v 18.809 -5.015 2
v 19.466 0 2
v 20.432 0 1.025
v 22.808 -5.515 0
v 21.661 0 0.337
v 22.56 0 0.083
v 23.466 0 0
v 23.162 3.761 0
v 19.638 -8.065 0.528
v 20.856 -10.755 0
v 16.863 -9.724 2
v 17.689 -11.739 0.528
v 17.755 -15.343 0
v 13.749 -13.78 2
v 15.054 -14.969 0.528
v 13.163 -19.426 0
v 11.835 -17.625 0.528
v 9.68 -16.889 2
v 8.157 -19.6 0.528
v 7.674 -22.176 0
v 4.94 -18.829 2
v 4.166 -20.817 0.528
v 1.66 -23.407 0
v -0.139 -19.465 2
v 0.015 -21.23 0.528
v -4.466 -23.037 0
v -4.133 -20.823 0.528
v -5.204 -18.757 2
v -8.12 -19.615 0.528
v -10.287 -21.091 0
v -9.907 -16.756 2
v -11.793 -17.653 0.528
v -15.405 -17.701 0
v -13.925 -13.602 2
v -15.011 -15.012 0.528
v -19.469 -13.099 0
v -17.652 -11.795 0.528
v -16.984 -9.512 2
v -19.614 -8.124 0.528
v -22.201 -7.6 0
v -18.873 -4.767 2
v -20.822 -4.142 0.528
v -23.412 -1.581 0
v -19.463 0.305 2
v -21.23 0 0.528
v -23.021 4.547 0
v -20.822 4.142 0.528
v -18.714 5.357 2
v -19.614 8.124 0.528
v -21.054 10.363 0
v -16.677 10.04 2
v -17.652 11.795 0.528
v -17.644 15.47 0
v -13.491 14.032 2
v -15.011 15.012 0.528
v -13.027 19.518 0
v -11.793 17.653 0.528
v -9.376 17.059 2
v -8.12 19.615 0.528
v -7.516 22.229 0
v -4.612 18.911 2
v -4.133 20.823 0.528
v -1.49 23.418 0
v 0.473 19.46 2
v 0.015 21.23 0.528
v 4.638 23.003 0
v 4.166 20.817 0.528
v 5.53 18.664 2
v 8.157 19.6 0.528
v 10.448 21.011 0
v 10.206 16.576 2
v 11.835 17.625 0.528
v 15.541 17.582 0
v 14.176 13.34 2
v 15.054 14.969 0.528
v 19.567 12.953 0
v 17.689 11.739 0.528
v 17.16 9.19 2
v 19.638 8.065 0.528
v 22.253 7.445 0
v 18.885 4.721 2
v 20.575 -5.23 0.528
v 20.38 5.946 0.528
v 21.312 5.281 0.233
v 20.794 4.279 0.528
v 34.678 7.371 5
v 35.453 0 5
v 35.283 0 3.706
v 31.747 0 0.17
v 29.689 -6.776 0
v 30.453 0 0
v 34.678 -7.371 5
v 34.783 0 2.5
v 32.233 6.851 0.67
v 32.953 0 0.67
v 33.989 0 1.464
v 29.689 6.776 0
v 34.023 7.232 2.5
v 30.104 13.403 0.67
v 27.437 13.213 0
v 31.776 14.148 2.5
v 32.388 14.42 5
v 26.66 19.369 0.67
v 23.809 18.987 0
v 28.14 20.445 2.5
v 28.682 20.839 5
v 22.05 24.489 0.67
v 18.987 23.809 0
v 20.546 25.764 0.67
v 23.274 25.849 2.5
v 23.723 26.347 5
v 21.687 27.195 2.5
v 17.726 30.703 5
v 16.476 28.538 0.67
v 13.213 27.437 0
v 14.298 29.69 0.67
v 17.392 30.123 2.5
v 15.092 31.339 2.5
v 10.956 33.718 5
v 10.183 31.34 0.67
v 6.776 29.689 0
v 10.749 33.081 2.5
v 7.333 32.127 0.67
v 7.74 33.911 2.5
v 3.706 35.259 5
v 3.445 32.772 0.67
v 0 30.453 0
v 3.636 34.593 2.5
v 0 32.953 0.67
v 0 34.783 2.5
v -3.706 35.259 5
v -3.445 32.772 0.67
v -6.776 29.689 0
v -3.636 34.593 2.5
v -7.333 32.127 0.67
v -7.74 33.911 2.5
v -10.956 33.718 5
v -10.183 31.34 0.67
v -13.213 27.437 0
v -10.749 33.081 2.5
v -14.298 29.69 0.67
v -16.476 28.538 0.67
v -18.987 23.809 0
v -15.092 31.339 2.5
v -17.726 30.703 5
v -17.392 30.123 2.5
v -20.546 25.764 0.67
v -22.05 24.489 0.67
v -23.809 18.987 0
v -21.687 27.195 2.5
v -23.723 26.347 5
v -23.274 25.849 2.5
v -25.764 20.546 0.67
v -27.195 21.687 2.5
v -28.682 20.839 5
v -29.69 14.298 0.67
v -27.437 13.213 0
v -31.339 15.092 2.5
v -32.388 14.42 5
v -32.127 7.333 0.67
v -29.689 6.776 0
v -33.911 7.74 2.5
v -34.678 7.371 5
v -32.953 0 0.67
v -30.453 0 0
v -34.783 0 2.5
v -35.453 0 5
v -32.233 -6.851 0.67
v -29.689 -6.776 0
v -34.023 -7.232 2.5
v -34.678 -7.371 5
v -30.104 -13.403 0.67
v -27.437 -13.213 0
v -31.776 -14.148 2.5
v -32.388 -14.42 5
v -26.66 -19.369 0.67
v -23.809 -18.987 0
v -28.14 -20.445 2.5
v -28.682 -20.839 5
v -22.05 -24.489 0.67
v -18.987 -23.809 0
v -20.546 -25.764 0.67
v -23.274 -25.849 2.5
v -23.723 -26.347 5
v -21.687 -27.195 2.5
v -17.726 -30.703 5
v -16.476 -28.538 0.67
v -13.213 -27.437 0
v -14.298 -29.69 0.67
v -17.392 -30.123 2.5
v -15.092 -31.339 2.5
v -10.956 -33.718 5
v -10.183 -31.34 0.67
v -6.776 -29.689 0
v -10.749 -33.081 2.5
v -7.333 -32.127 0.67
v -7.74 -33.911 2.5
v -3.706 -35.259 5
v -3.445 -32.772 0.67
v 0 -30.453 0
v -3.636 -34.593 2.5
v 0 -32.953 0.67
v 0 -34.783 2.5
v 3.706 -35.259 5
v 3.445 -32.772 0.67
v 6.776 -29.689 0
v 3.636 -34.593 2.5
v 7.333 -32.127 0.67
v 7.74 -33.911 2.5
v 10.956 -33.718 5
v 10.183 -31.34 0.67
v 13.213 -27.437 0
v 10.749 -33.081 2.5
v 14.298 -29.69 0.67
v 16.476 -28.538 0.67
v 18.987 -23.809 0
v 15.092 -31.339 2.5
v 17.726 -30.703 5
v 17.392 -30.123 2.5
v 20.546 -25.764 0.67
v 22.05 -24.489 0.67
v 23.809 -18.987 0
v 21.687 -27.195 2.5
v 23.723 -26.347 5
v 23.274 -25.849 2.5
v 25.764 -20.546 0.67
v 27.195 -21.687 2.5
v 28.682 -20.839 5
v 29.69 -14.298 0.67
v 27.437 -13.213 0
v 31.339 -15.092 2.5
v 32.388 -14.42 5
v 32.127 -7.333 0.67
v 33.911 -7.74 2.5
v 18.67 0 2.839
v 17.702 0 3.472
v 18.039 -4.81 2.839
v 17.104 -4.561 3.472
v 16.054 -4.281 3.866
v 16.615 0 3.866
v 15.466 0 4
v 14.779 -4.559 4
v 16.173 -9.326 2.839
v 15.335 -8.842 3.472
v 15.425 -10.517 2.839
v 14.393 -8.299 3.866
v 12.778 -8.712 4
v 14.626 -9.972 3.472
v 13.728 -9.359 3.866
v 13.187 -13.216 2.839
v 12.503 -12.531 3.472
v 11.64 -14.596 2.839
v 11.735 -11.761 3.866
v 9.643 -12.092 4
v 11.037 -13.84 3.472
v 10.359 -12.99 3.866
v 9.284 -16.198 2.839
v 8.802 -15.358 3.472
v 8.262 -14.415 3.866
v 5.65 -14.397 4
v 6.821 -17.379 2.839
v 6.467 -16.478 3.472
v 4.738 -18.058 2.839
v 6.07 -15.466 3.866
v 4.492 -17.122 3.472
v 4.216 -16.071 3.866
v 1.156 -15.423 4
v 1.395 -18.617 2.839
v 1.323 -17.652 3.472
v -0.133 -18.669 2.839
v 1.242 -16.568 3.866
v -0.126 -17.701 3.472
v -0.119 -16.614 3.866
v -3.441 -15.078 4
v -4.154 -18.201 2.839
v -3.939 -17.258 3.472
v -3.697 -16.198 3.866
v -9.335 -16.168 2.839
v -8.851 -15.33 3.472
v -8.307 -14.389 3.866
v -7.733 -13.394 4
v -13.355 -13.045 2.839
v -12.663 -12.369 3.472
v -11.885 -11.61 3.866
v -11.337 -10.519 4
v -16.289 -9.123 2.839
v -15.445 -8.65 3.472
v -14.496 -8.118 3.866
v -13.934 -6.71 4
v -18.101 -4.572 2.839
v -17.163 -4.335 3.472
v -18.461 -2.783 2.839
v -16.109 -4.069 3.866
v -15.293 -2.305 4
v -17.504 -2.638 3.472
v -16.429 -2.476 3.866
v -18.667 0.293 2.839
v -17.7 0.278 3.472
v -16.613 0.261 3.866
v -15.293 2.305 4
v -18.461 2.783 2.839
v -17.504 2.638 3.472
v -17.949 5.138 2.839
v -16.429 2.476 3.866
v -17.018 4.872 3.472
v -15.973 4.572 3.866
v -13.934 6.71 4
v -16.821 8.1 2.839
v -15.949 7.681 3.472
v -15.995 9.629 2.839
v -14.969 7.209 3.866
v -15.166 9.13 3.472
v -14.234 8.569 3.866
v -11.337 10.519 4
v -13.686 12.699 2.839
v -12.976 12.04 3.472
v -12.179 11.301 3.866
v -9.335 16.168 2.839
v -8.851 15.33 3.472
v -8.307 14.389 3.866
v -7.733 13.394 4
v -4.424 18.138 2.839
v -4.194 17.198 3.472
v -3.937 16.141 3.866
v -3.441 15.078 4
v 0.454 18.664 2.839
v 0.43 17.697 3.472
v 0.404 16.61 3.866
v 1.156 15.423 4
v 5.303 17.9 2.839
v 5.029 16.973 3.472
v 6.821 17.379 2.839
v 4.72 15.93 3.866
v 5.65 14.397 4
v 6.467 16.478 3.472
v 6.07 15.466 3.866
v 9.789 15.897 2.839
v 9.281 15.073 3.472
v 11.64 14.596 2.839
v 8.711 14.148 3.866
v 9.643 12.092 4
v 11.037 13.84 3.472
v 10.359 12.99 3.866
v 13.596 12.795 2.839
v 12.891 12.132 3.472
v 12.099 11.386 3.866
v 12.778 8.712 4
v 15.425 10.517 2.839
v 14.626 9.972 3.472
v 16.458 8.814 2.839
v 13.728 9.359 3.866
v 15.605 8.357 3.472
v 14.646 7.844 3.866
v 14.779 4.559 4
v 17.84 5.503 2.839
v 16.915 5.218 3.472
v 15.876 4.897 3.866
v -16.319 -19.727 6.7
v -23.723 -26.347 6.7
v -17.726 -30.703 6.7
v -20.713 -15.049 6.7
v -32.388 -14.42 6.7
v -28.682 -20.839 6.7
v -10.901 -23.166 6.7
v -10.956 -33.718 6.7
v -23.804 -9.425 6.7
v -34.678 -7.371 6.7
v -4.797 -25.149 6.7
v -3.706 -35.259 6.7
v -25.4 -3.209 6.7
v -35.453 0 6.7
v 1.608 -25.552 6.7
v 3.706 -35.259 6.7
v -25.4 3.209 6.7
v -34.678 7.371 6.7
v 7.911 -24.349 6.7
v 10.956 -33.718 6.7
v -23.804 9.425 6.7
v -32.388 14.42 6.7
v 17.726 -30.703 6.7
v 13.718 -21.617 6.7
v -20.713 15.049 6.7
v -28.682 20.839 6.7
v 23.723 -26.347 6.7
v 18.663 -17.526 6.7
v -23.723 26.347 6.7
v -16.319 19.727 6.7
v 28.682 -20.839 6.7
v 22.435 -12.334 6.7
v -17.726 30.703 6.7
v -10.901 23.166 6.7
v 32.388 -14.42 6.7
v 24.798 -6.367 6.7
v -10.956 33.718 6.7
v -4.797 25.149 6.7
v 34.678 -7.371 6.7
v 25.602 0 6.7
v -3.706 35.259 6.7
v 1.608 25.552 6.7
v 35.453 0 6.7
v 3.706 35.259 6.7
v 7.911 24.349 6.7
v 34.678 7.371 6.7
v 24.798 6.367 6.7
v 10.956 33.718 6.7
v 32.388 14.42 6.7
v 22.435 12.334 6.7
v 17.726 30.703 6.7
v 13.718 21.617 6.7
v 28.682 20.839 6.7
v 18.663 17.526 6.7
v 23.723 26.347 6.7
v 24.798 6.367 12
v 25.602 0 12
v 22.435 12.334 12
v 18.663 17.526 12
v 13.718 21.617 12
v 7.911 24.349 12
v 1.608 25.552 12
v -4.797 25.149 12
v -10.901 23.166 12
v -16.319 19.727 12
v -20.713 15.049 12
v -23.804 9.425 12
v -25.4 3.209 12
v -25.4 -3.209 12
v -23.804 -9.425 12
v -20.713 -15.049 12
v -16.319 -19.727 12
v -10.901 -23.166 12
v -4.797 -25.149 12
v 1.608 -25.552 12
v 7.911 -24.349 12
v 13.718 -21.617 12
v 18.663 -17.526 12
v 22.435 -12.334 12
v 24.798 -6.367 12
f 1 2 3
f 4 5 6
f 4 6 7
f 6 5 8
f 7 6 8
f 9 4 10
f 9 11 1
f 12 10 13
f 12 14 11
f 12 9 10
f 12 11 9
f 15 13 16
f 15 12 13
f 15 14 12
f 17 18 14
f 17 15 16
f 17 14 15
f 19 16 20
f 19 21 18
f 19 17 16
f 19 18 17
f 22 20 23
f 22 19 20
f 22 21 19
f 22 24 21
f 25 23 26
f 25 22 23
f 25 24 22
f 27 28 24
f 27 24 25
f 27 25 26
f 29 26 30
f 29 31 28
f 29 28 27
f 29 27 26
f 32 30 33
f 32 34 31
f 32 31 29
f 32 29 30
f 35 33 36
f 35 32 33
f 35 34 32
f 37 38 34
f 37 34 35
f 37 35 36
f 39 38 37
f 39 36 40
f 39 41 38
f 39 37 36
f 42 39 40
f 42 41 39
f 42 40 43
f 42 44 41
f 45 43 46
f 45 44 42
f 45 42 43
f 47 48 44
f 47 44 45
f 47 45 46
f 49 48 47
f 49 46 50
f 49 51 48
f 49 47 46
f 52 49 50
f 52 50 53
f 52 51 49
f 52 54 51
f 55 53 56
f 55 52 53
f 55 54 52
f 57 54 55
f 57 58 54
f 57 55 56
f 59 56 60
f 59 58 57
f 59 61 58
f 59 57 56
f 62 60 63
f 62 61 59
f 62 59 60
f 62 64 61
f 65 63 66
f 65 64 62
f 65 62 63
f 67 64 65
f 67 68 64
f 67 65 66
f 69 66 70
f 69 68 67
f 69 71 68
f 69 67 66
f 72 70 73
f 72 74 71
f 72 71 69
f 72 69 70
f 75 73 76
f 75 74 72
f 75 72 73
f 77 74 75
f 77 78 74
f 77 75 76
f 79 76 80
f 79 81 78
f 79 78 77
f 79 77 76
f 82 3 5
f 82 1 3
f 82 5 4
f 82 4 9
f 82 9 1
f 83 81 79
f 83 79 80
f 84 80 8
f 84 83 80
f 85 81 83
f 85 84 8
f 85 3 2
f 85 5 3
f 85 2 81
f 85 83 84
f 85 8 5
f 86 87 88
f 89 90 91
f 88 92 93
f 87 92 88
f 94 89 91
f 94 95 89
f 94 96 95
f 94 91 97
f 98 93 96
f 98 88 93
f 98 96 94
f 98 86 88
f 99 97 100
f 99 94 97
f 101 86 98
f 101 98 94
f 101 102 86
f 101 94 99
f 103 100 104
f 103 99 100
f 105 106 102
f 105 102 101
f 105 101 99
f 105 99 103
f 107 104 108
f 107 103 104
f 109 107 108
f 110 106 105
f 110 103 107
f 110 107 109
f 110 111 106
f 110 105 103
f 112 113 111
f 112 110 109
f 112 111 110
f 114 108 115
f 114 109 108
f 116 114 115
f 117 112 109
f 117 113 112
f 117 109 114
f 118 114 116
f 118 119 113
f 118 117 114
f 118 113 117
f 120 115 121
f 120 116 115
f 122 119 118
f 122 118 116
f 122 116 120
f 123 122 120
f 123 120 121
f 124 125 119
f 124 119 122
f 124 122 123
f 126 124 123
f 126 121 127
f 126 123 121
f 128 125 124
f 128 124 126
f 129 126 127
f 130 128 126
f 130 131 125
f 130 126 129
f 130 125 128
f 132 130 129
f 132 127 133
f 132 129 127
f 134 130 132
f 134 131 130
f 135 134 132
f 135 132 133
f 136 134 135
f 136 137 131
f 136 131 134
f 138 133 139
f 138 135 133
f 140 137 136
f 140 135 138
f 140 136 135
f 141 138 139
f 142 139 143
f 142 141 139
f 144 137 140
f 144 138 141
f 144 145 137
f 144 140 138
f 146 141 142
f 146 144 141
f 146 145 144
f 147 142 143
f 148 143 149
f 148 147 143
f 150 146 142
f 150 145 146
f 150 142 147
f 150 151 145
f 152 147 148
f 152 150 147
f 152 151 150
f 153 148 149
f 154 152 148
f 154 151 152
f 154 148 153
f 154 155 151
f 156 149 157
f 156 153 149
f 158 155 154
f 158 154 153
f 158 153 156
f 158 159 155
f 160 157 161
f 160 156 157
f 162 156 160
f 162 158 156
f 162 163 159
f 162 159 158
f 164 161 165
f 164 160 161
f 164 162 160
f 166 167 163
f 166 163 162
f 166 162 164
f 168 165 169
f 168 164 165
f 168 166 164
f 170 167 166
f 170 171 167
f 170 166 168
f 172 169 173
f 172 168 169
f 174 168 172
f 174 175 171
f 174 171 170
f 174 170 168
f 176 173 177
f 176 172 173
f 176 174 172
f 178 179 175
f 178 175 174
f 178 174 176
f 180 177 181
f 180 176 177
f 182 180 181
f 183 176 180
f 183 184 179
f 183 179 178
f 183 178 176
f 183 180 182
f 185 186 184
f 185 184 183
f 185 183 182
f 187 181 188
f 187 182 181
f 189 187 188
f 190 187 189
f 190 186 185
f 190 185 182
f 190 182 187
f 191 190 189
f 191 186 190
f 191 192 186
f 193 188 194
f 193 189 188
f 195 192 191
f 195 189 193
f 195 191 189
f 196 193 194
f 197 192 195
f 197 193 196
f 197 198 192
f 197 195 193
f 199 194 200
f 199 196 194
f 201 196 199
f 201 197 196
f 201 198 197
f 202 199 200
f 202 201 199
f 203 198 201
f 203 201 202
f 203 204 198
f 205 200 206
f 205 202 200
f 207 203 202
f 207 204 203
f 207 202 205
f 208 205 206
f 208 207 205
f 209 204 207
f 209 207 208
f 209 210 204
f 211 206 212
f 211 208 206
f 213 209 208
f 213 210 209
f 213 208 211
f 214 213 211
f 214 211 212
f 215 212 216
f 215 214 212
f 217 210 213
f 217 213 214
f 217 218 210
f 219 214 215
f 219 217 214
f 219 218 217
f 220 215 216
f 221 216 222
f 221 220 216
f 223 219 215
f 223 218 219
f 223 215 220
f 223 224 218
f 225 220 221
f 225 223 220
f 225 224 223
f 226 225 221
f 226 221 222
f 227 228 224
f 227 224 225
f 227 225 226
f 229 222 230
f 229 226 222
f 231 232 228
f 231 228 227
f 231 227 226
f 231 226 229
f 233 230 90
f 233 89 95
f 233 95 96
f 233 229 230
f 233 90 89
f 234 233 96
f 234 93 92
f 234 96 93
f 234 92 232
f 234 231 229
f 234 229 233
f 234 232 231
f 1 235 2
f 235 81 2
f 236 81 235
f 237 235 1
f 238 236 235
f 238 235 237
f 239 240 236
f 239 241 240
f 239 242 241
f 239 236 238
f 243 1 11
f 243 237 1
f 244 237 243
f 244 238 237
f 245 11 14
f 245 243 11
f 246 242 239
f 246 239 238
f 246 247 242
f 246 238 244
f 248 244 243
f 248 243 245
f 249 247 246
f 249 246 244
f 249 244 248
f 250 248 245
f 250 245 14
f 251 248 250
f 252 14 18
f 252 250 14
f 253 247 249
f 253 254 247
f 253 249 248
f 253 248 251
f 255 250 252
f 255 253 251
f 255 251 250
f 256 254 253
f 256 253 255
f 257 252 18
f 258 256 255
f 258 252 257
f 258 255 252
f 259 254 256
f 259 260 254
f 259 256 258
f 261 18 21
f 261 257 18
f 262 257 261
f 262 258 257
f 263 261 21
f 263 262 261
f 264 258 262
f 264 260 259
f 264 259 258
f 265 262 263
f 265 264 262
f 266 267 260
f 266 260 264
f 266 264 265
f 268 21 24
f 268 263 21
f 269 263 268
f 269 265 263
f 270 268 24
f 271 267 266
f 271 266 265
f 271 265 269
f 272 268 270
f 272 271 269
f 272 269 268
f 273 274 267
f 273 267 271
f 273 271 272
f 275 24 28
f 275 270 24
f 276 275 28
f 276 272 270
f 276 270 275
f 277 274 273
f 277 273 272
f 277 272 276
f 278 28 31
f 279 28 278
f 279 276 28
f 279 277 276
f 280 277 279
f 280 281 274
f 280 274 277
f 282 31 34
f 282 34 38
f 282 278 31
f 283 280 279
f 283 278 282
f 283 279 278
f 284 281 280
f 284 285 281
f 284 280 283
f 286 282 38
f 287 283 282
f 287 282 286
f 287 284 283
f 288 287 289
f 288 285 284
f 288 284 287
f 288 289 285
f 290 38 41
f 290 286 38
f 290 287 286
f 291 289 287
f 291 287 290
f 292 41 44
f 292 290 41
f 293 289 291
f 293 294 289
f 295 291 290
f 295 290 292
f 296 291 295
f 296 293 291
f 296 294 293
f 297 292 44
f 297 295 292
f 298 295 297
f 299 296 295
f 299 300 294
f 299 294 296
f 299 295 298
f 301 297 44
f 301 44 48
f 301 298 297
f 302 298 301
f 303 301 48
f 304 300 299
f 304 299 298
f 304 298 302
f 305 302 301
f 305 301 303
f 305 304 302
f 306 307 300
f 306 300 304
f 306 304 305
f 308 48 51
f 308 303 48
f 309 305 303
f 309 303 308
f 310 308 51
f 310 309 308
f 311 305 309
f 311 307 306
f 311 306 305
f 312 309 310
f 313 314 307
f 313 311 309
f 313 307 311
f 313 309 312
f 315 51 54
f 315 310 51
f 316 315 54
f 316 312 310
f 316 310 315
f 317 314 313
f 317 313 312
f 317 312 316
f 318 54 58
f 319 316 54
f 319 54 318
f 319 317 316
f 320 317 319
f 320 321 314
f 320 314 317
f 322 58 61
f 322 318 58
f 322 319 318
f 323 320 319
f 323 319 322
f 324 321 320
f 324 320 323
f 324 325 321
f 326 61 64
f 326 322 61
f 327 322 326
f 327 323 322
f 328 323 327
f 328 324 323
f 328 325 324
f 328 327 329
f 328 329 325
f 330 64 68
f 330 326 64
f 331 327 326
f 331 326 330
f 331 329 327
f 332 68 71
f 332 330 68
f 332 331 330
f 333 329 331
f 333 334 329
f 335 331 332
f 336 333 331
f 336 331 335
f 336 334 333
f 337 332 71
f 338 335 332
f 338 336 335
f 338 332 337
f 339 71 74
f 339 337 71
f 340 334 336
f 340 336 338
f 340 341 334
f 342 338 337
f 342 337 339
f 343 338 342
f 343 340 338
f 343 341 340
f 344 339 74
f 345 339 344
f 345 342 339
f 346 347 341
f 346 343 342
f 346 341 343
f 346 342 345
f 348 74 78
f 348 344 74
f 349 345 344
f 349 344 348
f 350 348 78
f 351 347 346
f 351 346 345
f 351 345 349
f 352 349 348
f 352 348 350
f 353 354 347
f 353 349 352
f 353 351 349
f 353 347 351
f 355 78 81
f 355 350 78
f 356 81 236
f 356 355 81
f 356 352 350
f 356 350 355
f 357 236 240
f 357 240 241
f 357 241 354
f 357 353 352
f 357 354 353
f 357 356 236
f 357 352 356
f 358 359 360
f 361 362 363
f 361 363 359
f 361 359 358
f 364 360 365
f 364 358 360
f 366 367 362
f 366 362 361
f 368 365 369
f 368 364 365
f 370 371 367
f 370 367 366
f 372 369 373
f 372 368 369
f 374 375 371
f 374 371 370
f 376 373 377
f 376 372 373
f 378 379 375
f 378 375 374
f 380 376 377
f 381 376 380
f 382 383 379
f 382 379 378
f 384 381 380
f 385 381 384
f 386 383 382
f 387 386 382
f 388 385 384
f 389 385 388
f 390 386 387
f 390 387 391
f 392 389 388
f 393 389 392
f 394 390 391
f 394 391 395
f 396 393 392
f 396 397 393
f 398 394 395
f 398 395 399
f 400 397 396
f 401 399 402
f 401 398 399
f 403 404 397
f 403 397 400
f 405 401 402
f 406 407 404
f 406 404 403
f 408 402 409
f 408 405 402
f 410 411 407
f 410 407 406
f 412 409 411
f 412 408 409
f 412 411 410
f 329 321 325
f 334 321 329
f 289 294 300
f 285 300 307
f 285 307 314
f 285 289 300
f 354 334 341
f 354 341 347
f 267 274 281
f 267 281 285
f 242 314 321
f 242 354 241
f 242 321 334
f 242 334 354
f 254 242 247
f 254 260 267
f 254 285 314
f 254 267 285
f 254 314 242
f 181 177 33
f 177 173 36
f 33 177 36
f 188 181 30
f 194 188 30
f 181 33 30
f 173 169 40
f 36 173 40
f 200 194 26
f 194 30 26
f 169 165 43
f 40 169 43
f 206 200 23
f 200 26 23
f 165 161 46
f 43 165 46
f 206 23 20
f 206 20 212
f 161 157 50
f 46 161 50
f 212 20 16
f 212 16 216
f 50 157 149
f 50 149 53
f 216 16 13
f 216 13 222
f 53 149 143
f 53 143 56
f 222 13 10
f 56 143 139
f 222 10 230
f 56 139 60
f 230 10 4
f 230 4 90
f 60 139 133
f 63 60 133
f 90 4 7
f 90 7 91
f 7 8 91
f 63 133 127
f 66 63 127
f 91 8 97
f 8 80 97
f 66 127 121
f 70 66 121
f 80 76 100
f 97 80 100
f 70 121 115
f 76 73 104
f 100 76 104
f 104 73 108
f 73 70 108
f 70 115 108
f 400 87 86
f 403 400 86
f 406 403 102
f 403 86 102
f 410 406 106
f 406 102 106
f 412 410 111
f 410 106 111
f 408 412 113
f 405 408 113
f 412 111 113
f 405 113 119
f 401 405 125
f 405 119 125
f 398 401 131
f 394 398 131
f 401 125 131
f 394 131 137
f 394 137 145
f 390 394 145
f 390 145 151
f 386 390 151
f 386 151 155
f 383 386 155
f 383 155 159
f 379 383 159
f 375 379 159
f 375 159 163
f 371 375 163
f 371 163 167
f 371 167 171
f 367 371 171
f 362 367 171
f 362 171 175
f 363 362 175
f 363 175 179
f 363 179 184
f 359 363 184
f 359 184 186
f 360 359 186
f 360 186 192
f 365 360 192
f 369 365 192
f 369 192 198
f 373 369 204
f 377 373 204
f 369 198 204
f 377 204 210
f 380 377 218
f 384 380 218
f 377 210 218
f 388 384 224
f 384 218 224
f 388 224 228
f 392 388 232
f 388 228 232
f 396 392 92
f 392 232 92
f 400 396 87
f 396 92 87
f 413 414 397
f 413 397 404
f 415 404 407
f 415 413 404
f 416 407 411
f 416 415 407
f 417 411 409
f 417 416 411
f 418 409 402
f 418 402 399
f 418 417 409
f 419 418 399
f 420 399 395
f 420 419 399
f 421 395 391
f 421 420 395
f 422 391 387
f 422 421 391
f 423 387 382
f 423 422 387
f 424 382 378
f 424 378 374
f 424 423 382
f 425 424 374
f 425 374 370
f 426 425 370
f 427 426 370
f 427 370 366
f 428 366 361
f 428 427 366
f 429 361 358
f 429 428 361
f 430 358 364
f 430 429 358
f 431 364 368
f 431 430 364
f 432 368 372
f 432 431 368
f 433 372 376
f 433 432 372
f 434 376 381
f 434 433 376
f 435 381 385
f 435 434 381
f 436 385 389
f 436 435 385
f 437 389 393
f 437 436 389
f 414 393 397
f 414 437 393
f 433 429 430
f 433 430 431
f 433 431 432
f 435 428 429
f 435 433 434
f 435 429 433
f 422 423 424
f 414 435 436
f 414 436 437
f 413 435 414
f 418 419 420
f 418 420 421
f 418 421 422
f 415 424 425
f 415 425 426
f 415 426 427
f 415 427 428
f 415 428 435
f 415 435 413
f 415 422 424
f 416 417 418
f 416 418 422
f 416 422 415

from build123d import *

# Parameters (mm, degrees)
F0_R     = 35.4529924148
F0_R_2   = 26.5998947574
F1_DEPTH = 12
F2_R     = 20.3647706408
F3_DEPTH = 4
F5_R     = 5
F6_R     = 5
F7_R     = 35.4529924148
F7_R_2   = 25.6021329211
F8_DEPTH = 5.3


# Not quite as in the source:
# - a fillet or chamfer that OpenCascade refuses, or shapes differently, is made with other operations: its cross-section is extruded or revolved along the edge and cut away or added


with BuildPart() as f1:
    # F0 (on Top) → F1 (new body)
    with BuildSketch(Plane.XY):
        Circle(F0_R)
        Circle(F0_R_2, mode=Mode.SUBTRACT)
        Circle(F0_R_2)
    extrude(amount=F1_DEPTH)

    # F2 (on face) → F3 (cut)
    with BuildSketch(Plane(origin=(0, 0, 0), x_dir=(1, 0, 0), z_dir=(0, 0, -1))):
        Circle(F2_R)
    extrude(amount=-F3_DEPTH, mode=Mode.SUBTRACT)

    # F4: fillet of radius 5 on 1 edges, made by hand

    # F4_s1 → F4_t2 (revolve)
    with BuildSketch(Plane.XZ):
        with BuildLine():
            ThreePointArc((20.3647706408, 0), (18.6280688154, 2.8729833462), (15.4657911552, 4))
            Line((15.4657911552, 4), (20.3647706408, 4))
            Line((20.3647706408, 4), (20.3647706408, 0))
        make_face()
    revolve(axis=Axis((0, 0, 4), (0, 0, -1)))

    # F5
    f5_edges = [f1.edges().sort_by_distance(p)[0] for p in [
        (-20.364771, 0, 0),
    ]]
    fillet(f5_edges, radius=F5_R)

    # F6
    f6_edges = [f1.edges().sort_by_distance(p)[0] for p in [
        (-35.452992, 0, 0),
    ]]
    fillet(f6_edges, radius=F6_R)

    # F7 (on face) → F8 (cut)
    with BuildSketch(Plane.XY.offset(12)):
        Circle(F7_R)
        Circle(F7_R_2, mode=Mode.SUBTRACT)
    extrude(amount=-F8_DEPTH, mode=Mode.SUBTRACT)


solid = f1.part
